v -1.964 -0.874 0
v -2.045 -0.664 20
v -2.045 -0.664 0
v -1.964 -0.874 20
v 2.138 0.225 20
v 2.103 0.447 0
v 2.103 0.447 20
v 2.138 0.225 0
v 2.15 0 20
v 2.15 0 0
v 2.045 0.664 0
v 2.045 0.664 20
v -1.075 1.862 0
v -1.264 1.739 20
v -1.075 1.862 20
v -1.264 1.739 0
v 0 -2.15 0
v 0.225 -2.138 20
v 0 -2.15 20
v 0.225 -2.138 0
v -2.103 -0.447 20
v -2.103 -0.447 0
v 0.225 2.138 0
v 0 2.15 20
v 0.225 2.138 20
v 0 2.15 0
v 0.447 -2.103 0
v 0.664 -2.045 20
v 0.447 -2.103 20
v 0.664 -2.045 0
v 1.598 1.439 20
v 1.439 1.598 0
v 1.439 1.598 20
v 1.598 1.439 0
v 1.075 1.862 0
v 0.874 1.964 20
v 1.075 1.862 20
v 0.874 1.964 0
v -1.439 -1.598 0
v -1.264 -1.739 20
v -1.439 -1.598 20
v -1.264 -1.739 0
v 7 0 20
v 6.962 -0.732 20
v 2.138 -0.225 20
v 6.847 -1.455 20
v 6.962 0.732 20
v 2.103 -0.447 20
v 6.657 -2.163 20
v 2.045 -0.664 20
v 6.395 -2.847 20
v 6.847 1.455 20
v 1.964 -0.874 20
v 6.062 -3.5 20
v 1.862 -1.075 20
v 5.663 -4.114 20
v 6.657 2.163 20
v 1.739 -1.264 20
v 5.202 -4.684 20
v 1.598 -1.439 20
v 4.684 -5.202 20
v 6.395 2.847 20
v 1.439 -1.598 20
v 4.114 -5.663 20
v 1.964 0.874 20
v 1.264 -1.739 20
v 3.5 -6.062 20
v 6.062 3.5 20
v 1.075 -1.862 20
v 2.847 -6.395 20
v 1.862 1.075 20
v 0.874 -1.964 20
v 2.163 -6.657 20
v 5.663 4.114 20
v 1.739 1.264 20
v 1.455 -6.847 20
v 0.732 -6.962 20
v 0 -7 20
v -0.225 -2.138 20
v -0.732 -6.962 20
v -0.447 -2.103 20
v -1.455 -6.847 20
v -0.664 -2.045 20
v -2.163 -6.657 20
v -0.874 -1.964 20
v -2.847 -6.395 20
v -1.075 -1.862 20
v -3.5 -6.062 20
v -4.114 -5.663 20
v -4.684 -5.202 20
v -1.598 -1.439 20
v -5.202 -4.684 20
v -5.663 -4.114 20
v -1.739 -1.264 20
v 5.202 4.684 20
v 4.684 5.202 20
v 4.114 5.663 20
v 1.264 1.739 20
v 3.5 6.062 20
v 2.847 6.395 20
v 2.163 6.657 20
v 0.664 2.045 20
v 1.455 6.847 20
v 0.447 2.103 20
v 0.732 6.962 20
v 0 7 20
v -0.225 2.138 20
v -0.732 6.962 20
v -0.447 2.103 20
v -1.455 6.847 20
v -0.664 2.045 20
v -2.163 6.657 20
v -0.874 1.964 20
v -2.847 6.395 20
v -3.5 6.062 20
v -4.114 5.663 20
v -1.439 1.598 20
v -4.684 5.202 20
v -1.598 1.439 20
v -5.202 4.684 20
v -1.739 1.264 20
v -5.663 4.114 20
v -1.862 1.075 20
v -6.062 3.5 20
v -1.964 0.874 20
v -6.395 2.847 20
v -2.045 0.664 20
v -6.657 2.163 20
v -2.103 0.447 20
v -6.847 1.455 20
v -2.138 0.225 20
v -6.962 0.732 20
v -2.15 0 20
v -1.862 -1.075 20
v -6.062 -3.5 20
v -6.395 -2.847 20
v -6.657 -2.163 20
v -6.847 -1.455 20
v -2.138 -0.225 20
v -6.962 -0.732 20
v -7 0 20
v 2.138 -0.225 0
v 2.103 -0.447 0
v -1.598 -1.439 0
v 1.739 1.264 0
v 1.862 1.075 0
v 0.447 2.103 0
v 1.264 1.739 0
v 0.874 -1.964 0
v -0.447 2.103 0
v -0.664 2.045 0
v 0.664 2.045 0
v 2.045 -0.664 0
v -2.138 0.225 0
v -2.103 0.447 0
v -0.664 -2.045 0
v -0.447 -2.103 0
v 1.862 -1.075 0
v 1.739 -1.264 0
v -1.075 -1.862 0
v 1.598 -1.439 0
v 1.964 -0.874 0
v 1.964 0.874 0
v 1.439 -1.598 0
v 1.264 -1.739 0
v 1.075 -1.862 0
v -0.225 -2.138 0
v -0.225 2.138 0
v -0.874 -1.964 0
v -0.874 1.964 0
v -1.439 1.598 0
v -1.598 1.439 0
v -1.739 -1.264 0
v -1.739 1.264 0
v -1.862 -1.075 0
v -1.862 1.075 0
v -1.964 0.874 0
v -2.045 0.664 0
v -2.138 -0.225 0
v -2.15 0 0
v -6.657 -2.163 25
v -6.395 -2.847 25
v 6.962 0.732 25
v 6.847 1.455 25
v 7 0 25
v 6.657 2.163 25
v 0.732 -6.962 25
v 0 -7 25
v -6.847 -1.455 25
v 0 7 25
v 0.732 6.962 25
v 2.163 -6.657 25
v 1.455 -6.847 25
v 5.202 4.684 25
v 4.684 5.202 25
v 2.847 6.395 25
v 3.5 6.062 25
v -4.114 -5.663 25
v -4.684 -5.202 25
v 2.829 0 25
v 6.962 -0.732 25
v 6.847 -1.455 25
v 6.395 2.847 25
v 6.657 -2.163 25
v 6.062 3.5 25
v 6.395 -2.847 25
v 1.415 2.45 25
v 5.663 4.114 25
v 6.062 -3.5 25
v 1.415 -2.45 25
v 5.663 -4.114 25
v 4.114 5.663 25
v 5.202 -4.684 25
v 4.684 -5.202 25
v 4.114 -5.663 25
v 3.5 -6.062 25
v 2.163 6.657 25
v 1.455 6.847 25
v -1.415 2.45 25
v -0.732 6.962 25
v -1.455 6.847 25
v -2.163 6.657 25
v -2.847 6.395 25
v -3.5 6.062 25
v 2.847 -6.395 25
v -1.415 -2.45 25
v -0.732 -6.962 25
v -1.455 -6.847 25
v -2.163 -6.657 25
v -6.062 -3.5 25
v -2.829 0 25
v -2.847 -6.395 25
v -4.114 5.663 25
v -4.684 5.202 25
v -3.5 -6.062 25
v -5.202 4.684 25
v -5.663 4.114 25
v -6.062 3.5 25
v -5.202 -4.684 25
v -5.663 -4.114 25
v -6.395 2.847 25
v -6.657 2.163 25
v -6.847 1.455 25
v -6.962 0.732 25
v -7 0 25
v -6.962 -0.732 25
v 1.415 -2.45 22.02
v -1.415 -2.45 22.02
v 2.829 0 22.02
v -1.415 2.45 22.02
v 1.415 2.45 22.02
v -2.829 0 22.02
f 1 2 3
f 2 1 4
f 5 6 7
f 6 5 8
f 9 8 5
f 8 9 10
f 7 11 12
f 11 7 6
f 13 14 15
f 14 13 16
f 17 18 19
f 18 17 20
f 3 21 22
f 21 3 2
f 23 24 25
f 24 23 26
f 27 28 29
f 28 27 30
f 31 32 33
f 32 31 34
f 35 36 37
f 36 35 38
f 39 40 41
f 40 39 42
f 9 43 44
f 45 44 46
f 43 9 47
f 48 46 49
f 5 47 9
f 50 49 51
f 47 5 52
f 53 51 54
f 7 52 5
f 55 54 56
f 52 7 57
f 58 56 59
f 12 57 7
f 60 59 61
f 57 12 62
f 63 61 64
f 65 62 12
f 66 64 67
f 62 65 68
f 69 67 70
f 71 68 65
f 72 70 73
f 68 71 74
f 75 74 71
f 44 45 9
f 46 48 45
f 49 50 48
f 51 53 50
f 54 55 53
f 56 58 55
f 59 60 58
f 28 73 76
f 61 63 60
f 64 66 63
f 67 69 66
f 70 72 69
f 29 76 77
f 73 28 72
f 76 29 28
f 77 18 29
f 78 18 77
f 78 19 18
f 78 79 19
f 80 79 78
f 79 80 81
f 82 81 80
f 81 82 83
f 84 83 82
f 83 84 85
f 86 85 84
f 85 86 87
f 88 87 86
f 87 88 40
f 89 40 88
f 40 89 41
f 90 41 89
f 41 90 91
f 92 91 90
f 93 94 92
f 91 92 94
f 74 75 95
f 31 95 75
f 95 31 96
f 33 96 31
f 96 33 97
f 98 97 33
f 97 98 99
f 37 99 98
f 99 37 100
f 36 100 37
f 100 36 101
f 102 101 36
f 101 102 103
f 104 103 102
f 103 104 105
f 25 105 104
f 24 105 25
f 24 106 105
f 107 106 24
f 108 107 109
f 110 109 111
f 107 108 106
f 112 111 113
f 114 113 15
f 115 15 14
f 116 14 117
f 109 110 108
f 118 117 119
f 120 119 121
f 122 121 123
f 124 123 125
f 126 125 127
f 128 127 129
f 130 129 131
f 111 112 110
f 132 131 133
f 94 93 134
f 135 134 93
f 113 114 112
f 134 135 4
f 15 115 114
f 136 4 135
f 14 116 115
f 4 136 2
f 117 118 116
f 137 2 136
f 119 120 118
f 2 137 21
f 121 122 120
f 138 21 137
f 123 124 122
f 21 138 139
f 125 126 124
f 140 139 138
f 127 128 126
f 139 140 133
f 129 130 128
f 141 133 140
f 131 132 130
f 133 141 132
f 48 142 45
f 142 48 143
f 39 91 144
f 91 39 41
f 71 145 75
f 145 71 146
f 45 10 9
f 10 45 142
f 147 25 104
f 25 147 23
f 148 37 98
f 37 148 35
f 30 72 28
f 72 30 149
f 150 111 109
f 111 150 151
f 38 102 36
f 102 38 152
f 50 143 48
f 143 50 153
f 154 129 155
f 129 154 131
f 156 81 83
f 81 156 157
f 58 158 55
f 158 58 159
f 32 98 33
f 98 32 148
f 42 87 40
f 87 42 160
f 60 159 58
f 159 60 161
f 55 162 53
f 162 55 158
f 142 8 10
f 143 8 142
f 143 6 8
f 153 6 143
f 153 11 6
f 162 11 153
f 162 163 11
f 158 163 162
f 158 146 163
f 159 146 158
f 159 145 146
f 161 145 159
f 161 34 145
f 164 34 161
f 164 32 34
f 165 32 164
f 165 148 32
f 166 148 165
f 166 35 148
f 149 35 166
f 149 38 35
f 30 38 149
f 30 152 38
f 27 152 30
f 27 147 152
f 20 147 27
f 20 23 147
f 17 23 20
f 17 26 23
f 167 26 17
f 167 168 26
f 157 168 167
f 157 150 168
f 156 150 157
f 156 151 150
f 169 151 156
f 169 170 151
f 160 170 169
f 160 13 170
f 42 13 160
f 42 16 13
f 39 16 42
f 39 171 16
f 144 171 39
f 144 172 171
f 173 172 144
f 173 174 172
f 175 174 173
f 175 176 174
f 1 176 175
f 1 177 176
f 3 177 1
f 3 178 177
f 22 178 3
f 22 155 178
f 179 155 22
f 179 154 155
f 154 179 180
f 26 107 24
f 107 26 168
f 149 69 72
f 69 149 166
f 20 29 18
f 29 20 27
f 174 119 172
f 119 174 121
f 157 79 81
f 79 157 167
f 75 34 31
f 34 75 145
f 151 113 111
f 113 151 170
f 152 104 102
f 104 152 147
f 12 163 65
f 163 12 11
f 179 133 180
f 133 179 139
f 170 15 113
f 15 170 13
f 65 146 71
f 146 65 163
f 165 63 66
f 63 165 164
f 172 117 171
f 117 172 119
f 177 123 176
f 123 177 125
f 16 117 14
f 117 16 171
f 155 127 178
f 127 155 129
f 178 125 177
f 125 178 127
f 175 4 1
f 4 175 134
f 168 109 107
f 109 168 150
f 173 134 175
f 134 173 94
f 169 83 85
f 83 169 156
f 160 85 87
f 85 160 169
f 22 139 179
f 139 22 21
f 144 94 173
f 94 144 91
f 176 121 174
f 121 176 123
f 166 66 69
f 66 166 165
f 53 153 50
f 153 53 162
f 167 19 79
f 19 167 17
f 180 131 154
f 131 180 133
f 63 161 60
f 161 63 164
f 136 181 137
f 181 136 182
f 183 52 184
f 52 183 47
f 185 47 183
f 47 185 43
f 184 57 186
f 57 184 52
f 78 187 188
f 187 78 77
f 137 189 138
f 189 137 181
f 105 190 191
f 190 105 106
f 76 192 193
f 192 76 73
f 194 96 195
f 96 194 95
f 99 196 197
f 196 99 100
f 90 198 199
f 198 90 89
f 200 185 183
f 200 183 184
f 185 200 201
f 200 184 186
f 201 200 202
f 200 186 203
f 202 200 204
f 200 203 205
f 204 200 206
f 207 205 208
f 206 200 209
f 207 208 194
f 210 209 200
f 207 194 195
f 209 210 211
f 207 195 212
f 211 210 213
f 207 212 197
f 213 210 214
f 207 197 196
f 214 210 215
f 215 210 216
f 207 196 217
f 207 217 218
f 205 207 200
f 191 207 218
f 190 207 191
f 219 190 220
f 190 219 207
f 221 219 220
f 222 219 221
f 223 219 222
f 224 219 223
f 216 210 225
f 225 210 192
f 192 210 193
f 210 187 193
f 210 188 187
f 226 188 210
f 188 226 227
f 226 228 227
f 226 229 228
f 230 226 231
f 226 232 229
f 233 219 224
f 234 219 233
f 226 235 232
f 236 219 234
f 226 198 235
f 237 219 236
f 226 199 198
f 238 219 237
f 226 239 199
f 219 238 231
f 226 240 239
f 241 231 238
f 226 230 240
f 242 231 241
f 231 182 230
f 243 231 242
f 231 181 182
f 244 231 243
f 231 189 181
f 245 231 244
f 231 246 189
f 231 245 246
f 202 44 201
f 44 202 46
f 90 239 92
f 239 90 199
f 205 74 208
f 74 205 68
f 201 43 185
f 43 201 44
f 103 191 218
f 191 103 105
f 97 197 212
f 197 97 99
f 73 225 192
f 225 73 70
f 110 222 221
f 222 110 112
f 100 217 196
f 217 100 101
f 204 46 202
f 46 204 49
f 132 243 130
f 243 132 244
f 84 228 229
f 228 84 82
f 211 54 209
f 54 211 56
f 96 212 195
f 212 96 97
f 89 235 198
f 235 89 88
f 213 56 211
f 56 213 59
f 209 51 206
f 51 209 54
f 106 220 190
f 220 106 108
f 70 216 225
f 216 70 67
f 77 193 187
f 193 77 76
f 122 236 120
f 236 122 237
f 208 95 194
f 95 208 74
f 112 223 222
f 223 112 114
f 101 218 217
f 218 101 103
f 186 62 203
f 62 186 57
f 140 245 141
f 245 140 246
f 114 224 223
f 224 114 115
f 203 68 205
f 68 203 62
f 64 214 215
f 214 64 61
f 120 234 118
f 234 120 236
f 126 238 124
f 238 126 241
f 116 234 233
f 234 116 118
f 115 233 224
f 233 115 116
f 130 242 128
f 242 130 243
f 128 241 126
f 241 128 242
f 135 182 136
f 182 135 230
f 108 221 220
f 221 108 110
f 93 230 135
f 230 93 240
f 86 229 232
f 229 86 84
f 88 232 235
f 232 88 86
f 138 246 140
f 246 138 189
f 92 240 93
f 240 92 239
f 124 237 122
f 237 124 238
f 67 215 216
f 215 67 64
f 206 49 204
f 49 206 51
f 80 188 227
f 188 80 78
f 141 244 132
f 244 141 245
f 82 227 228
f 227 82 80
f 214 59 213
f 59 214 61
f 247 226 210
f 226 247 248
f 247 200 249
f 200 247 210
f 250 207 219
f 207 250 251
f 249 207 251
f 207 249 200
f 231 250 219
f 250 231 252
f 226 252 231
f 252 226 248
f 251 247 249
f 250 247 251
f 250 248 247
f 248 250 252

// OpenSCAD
// Thumb screw, smooth-shank representation.
$fn = 60;
eps = 0.02;
shaft_d = 4.3;
head_d = 14;
shaft_l = 20;
head_h = 5;
difference() {
    union() { cylinder(d = shaft_d, h = shaft_l); translate([0, 0, shaft_l]) cylinder(d = head_d, h = head_h); }
    translate([0, 0, shaft_l + head_h - 3 + eps]) cylinder(d = head_d * 0.35 / cos(30), h = 3 + eps, $fn = 6);
}
